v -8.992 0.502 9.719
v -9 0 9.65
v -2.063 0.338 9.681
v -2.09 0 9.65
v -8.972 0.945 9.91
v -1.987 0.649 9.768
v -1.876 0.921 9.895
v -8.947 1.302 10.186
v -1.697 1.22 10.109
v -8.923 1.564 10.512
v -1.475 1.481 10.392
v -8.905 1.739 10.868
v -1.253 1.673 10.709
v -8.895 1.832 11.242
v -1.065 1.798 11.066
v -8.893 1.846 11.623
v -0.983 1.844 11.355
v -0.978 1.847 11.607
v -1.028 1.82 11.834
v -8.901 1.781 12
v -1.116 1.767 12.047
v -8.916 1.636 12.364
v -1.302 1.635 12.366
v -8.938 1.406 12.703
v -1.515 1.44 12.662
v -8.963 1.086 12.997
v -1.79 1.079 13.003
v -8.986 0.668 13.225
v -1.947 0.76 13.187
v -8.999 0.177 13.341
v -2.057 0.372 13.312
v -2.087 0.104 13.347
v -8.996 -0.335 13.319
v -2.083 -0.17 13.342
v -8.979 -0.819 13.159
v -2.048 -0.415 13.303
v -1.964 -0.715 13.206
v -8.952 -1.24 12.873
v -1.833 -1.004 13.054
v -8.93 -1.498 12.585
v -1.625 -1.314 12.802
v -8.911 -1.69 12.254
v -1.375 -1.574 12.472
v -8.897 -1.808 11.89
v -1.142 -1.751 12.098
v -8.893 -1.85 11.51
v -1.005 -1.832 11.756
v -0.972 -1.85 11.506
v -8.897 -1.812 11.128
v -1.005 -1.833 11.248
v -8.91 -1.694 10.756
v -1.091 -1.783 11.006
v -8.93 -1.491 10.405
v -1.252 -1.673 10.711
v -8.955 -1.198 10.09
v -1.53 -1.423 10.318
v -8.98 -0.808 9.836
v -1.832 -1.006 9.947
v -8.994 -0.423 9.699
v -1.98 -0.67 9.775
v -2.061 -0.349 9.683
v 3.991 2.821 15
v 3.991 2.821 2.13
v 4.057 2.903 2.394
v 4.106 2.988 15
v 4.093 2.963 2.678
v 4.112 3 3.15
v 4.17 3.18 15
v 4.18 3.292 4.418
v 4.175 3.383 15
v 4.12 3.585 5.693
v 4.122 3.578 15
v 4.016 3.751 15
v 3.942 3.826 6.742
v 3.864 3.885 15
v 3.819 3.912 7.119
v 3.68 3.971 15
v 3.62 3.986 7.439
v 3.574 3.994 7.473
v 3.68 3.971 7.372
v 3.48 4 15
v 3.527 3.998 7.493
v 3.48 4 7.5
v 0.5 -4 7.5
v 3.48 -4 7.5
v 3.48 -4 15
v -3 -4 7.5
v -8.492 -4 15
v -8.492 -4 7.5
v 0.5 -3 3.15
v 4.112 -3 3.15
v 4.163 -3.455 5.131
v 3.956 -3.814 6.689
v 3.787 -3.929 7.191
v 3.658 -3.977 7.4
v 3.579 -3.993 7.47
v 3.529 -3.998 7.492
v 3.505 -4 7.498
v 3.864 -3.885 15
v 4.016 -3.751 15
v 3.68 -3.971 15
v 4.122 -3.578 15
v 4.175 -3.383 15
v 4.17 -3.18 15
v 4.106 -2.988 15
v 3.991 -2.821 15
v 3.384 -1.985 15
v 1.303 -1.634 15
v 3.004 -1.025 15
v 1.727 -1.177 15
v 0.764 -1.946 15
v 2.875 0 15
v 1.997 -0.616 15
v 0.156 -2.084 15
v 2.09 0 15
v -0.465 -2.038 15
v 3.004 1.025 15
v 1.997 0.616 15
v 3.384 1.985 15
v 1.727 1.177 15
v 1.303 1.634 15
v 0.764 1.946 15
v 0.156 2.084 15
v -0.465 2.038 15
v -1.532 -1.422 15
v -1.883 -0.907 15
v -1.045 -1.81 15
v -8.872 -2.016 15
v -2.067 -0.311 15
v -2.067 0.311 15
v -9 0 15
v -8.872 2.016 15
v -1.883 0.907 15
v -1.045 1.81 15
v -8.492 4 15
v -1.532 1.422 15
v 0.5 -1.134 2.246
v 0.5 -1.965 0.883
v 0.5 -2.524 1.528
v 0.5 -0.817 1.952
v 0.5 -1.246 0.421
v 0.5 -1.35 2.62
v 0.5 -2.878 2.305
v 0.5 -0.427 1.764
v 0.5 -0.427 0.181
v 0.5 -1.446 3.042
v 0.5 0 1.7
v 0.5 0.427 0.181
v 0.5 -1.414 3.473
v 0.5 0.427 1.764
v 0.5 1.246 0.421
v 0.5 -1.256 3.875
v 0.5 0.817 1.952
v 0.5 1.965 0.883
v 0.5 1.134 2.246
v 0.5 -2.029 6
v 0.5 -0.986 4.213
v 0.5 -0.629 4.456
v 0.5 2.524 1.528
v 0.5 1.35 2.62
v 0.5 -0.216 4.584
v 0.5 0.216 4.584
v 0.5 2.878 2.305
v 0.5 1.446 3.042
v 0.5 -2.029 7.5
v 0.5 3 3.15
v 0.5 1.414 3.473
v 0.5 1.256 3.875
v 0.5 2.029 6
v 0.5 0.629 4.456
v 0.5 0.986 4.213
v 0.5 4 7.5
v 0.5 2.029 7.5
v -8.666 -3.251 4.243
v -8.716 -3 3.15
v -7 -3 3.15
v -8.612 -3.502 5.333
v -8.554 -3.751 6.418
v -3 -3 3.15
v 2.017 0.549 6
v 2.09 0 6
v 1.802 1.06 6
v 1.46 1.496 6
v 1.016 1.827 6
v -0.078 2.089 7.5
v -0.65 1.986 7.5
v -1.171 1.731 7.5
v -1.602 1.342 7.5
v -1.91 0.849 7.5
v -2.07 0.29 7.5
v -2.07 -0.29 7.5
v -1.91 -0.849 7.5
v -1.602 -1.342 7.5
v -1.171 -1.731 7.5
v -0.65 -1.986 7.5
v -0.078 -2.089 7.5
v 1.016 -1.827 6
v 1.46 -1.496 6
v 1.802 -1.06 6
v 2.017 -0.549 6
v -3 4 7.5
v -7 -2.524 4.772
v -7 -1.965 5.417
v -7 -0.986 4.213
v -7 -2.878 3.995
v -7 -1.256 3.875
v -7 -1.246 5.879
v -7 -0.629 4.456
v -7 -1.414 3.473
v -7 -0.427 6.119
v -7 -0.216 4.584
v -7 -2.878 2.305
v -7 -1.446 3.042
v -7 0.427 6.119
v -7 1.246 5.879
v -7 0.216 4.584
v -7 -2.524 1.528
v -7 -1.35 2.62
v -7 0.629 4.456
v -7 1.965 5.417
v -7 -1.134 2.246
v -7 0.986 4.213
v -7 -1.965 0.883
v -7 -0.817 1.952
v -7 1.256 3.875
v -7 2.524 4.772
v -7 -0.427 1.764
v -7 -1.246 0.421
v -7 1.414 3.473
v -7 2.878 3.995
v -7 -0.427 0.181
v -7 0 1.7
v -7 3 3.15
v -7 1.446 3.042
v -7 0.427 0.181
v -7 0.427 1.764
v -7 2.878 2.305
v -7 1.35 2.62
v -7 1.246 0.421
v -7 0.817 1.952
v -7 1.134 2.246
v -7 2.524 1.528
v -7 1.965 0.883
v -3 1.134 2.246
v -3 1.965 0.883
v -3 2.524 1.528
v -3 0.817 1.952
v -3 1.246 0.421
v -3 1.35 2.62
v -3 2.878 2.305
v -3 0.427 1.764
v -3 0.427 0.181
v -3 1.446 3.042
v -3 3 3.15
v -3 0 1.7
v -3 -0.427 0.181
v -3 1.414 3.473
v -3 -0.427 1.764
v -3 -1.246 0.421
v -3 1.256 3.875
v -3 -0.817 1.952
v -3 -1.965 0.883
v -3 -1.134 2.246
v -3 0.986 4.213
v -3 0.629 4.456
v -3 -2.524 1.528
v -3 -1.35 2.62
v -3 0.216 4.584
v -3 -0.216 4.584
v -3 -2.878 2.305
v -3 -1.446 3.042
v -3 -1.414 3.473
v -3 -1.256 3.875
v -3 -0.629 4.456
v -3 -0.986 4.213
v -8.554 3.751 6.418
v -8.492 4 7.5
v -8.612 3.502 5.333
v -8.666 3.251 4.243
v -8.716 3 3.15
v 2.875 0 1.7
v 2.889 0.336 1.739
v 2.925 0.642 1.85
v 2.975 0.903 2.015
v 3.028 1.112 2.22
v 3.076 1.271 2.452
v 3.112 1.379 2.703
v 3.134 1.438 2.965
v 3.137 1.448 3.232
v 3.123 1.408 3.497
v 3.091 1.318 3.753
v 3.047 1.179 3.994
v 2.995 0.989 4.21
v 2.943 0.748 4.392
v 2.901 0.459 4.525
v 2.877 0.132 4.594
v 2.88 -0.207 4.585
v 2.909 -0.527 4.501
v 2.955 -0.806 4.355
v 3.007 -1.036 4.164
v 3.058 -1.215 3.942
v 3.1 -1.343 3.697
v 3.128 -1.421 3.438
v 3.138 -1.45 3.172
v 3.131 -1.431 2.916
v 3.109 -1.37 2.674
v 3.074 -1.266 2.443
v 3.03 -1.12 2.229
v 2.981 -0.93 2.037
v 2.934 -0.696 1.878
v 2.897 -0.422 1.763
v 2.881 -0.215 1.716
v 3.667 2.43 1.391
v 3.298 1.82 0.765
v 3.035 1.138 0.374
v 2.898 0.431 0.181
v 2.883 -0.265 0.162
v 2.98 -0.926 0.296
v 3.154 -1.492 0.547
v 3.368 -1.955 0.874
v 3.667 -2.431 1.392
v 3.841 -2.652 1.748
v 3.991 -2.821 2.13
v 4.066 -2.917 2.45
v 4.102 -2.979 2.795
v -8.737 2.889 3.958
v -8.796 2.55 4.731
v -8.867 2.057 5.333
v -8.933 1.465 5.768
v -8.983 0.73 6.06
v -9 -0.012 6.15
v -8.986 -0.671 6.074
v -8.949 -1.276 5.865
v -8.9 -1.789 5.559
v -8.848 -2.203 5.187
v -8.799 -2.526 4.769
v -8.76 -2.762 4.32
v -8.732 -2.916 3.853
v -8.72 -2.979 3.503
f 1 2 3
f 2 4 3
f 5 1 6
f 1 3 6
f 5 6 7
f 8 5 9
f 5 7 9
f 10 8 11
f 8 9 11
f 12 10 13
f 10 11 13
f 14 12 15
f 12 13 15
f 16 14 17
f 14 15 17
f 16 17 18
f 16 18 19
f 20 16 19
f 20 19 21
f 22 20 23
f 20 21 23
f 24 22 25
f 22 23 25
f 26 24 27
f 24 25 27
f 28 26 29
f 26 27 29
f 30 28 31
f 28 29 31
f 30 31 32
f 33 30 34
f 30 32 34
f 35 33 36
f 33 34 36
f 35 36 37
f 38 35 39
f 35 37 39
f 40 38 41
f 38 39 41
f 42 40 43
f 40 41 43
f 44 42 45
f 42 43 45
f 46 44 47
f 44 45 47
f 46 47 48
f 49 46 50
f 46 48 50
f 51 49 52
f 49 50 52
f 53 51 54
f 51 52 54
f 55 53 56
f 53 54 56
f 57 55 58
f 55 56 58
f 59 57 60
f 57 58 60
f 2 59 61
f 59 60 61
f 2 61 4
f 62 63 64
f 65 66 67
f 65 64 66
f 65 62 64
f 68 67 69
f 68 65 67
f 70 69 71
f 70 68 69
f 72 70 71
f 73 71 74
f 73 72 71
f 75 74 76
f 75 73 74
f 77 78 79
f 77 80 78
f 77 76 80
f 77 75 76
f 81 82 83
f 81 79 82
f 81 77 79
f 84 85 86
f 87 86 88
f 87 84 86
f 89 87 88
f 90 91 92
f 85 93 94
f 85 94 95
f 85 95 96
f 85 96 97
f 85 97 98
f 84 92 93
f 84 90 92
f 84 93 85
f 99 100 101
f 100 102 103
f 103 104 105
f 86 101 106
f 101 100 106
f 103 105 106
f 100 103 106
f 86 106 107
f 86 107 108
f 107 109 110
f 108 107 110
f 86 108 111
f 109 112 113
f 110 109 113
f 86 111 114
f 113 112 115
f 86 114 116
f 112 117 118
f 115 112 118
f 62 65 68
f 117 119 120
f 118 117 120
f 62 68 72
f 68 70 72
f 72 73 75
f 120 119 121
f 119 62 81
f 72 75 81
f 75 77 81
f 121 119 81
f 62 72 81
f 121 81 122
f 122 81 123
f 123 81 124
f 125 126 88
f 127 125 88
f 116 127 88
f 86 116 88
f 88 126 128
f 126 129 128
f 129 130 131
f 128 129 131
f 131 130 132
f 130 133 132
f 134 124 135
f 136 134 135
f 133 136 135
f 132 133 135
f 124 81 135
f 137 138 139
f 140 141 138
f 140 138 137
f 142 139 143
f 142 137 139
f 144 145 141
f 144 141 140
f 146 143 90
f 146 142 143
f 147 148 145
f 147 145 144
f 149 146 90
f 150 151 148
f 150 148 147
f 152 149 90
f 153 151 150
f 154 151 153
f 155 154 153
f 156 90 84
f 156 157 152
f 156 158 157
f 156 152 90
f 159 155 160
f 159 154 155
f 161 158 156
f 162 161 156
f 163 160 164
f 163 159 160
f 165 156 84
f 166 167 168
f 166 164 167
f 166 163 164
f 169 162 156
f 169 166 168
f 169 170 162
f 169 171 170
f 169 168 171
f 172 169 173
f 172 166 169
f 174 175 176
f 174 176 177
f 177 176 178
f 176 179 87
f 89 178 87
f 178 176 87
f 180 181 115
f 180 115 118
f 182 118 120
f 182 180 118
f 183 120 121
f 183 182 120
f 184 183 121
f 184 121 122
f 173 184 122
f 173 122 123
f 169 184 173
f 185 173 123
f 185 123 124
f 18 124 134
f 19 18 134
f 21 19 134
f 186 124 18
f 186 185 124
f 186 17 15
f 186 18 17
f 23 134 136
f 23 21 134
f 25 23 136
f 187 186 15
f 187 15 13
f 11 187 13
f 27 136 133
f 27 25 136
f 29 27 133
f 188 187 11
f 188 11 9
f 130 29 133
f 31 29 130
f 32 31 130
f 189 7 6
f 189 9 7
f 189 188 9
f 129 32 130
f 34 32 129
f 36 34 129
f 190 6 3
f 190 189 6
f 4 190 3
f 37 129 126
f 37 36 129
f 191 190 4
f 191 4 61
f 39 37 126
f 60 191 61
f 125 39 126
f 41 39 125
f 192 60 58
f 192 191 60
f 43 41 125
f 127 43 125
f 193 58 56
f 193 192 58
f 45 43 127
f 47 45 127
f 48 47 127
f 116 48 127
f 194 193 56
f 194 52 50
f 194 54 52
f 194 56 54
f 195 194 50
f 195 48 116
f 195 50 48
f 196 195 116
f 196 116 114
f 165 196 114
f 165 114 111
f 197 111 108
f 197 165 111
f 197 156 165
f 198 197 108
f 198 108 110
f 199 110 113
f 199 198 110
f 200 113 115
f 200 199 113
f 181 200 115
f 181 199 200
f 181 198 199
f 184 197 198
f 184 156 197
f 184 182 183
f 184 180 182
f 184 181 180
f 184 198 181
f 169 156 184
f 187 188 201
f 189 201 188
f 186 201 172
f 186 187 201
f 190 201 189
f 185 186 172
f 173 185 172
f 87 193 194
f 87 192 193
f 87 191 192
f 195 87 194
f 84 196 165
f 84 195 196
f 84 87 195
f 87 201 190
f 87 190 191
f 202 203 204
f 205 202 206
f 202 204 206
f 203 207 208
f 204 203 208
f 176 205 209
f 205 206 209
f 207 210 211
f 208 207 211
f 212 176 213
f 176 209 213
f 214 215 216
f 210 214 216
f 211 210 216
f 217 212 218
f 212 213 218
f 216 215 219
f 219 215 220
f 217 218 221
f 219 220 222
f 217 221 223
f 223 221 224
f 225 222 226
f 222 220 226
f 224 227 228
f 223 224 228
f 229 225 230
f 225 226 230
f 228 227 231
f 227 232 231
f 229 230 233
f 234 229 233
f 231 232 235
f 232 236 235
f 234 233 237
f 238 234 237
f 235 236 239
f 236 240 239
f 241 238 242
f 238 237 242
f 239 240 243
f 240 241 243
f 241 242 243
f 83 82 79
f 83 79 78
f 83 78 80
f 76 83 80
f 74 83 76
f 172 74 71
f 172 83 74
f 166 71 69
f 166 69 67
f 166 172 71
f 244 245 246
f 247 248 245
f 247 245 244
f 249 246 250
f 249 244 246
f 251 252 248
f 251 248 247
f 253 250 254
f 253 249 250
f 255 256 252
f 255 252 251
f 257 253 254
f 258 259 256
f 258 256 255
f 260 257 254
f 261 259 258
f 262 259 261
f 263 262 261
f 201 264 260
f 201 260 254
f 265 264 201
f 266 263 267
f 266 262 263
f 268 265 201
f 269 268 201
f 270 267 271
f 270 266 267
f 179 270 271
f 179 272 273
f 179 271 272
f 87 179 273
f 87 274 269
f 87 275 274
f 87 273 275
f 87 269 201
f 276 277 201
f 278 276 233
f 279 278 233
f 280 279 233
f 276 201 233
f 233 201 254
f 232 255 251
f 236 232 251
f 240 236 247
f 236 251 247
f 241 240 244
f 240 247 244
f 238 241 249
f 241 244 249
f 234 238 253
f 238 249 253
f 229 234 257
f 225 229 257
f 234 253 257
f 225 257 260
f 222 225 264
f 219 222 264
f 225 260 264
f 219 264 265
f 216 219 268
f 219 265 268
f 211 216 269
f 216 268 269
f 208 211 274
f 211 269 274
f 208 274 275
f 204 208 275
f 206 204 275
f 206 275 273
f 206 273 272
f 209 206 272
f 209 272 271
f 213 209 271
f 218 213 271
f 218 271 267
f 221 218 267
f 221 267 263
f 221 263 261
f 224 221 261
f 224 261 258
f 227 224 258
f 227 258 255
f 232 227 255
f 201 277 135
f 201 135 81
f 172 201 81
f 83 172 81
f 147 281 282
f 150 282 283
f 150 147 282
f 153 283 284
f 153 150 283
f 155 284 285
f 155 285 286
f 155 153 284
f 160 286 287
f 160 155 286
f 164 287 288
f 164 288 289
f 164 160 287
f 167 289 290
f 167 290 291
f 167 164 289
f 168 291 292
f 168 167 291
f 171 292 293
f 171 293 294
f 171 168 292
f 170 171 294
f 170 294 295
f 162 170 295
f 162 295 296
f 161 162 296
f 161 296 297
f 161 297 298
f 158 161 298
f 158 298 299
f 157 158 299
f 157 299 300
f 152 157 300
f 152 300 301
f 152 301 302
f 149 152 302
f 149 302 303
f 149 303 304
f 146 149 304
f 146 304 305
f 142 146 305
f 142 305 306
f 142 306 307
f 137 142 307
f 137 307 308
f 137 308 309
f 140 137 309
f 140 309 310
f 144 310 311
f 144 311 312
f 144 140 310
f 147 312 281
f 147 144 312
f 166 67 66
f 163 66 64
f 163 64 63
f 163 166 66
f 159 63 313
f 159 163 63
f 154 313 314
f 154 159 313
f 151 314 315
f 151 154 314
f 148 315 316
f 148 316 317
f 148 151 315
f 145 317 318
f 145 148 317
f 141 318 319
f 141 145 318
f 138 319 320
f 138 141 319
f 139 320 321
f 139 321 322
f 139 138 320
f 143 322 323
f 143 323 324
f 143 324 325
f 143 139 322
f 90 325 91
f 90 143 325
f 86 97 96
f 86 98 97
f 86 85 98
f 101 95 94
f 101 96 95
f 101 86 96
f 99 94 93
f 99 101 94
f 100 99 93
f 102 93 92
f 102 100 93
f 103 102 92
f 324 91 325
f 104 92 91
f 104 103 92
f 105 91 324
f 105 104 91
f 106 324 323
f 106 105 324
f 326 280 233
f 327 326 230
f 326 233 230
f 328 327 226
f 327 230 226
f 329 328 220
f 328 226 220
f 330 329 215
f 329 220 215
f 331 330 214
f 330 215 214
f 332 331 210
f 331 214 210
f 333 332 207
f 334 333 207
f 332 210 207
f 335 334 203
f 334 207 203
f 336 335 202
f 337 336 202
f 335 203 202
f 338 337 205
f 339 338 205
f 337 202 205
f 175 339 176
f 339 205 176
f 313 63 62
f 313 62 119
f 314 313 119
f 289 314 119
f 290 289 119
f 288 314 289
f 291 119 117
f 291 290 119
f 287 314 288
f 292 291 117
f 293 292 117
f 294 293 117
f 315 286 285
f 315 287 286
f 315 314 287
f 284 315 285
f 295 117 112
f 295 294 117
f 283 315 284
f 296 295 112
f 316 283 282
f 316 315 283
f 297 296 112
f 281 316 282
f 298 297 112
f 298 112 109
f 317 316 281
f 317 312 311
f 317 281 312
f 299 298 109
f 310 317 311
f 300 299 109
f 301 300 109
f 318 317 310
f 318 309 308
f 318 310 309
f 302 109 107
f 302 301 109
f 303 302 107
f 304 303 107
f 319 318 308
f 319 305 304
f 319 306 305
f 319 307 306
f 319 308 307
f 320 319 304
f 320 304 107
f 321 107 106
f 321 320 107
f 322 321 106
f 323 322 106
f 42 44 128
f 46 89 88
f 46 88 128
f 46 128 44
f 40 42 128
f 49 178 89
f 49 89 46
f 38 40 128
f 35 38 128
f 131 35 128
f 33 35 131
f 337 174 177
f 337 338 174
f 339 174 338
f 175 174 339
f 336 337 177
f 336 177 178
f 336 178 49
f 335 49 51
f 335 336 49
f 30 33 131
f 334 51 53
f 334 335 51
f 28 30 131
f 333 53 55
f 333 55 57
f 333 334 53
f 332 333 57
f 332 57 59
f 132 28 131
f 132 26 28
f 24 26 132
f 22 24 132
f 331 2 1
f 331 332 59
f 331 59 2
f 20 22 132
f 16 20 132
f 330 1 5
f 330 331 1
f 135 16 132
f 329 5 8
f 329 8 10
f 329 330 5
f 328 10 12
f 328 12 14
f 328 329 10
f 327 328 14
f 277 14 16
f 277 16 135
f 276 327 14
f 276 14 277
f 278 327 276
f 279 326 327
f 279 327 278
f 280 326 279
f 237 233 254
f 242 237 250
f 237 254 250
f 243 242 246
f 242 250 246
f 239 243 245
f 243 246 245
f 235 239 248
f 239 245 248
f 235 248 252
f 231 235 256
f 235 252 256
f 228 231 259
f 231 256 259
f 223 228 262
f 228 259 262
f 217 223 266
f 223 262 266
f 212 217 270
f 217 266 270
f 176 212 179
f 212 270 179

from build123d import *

# Parameters (mm, degrees)
SCHIZZO1_R                           = 2.09
ESTRUSIONE_ESTRUSIONE1_DEPTH         = 15
SCHIZZO5_W                           = 3.5
SCHIZZO5_H                           = 7.5
TAGLIO_ESTRUSIONE4_DEPTH             = 9
ESTRUSIONE_ESTRUSIONE2_REACH         = 7.492
SCHIZZO6_W                           = 6
SCHIZZO6_H                           = 8
SCHIZZO7_R                           = 1.45
TAGLIO_ESTRUSIONE5_DEPTH             = 9.992075583
TAGLIO_ESTRUSIONE5_DEPTH_BACK        = 7.000142198
SCHIZZO7_4_R                         = 1.85
TAGLIO_ESTRUSIONE6_DEPTH             = 7.000142323
TAGLIO_ESTRUSIONE6_DIRECTION_2_REACH = 10.992
RACCORDO1_R                          = 0.7
RACCORDO2_R                          = 0.7
TAGLIO_ESTRUSIONE7_DEPTH             = 8.179825842
TAGLIO_ESTRUSIONE7_DEPTH_BACK        = 7.000142323
TAGLIO_ESTRUSIONE9_START             = -4
SCHIZZO9_R                           = 3
TAGLIO_ESTRUSIONE9_DEPTH             = 3.000142323


with BuildPart() as part:
    # Schizzo1 → Estrusione-Estrusione1 (new body)
    with BuildSketch(Plane.XY):
        with BuildLine():
            Line((5.992217781, -4), (-8.491933385, -4))
            ThreePointArc((-8.491933385, -4), (-9, 0), (-8.491933385, 4))
            Line((-8.491933385, 4), (5.992217781, 4))
            ThreePointArc((5.992217781, 4), (2.875, 0), (5.992217781, -4))
        make_face()
        Circle(SCHIZZO1_R, mode=Mode.SUBTRACT)
    extrude(amount=ESTRUSIONE_ESTRUSIONE1_DEPTH)

    # Schizzo5 → Taglio-Estrusione4 (cut, through all)
    with BuildSketch(Plane.XZ.offset(4)):
        with Locations((-1.249857802, 3.75)):
            Rectangle(SCHIZZO5_W, SCHIZZO5_H)
    extrude(amount=-TAGLIO_ESTRUSIONE4_DEPTH, mode=Mode.SUBTRACT)

    # Schizzo6 → Estrusione-Estrusione2 (add, up to next)
    with BuildSketch(Plane.ZY.offset(-0.500142198), mode=Mode.PRIVATE) as estrusione_estrusione2_sk1:
        with Locations((3, 0)):
            Rectangle(SCHIZZO6_W, SCHIZZO6_H)
    estrusione_estrusione2_tool1 = extrude(estrusione_estrusione2_sk1.sketch, amount=-ESTRUSIONE_ESTRUSIONE2_REACH, mode=Mode.PRIVATE) - part.part
    add(estrusione_estrusione2_tool1.solids().sort_by_distance((0.500142, 0, 3))[0])

    # Schizzo7 → Taglio-Estrusione5 (cut, two sides)
    with BuildSketch(Plane(origin=(-2.999857802, 0, 0), x_dir=(0, 0, -1), z_dir=(1, 0, 0))) as taglio_estrusione5_sk:
        with Locations((-3.15, 0)):
            Circle(SCHIZZO7_R)
    extrude(amount=TAGLIO_ESTRUSIONE5_DEPTH, mode=Mode.SUBTRACT)
    extrude(taglio_estrusione5_sk.sketch, amount=-TAGLIO_ESTRUSIONE5_DEPTH_BACK, mode=Mode.SUBTRACT)

    # Schizzo7<4> → Taglio-Estrusione6 (cut)
    with BuildSketch(Plane(origin=(-2.999857802, 0, 0), x_dir=(0, 0, -1), z_dir=(1, 0, 0))):
        with Locations((-11.5, 0)):
            Circle(SCHIZZO7_4_R)
    extrude(amount=-TAGLIO_ESTRUSIONE6_DEPTH, mode=Mode.SUBTRACT)

    # Schizzo7<4> → Taglio-Estrusione6 direction 2 (cut, up to next)
    with BuildSketch(Plane(origin=(-2.999857802, 0, 0), x_dir=(0, 0, -1), z_dir=(1, 0, 0)), mode=Mode.PRIVATE) as taglio_estrusione6_direction_2_sk1:
        with Locations((-11.5, 0)):
            Circle(SCHIZZO7_4_R)
    taglio_estrusione6_direction_2_tool1 = extrude(taglio_estrusione6_direction_2_sk1.sketch, amount=TAGLIO_ESTRUSIONE6_DIRECTION_2_REACH, mode=Mode.PRIVATE) & part.part
    add(taglio_estrusione6_direction_2_tool1.solids().sort_by_distance((-2.999858, 0, 11.5))[0], mode=Mode.SUBTRACT)

    # Raccordo1
    raccordo1_edges = [part.edges().sort_by_distance(p)[0] for p in [
        (5.992217781, 4, 7.5),
    ]]
    fillet(raccordo1_edges, radius=RACCORDO1_R)

    # Raccordo2
    raccordo2_edges = [part.edges().sort_by_distance(p)[0] for p in [
        (5.992217781, -4, 7.5),
    ]]
    fillet(raccordo2_edges, radius=RACCORDO2_R)

    # Schizzo8 → Taglio-Estrusione7 (cut, two sides)
    with BuildSketch(Plane(origin=(-2.999857802, 0, 0), x_dir=(0, 0, -1), z_dir=(1, 0, 0))) as taglio_estrusione7_sk:
        with BuildLine():
            Line((-3.15, -4), (0, -4))
            Line((0, -4), (0, 4))
            Line((0, 4), (-3.15, 4))
            Line((-3.15, 4), (-7.5, 4))
            Line((-7.5, 4), (-3.15, 3))
            ThreePointArc((-3.15, 3), (-0.15, 0), (-3.15, -3))
            Line((-3.15, -3), (-7.5, -4))
            Line((-7.5, -4), (-3.15, -4))
        make_face()
    extrude(amount=TAGLIO_ESTRUSIONE7_DEPTH, mode=Mode.SUBTRACT)
    extrude(taglio_estrusione7_sk.sketch, amount=-TAGLIO_ESTRUSIONE7_DEPTH_BACK, mode=Mode.SUBTRACT)

    # Schizzo9 → Taglio-Estrusione9 (cut, through all)
    with BuildSketch(Plane(origin=(-2.999857802, 0, 0), x_dir=(0, 0, -1), z_dir=(1, 0, 0)).offset(TAGLIO_ESTRUSIONE9_START)):
        with Locations((-3.15, 0)):
            Circle(SCHIZZO9_R)
    extrude(amount=-TAGLIO_ESTRUSIONE9_DEPTH, mode=Mode.SUBTRACT)


solid = part.part
